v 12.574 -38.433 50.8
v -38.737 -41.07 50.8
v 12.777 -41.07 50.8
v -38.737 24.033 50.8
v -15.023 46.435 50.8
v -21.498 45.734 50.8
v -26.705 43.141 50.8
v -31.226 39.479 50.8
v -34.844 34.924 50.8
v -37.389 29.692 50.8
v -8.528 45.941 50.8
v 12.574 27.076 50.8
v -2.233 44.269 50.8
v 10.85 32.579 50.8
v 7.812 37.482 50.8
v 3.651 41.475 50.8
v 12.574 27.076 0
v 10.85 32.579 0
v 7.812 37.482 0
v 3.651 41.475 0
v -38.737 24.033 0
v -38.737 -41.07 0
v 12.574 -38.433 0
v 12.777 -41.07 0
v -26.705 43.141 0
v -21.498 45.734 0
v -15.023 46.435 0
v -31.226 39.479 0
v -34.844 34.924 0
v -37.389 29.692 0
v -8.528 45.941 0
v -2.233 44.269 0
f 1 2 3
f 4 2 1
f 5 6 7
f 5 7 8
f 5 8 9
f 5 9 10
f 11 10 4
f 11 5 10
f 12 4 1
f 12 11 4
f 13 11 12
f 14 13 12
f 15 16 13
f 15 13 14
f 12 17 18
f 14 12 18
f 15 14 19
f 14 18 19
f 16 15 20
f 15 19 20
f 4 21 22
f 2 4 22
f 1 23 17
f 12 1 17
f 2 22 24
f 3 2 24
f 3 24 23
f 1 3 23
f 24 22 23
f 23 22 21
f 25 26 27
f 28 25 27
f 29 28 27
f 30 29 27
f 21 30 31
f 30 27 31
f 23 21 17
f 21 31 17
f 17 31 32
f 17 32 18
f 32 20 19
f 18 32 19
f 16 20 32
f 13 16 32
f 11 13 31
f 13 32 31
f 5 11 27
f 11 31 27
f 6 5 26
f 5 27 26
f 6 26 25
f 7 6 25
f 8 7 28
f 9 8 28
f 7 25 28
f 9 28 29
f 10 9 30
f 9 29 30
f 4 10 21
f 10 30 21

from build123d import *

# Parameters (mm, degrees)
F1_DEPTH = 50.8
F2_DEPTH = 25.4


with BuildPart() as f1:
    # F0 (on Top) → F1 (new body)
    with BuildSketch(Plane.XY):
        with BuildLine():
            ThreePointArc((3.650646, 41.4754), (-8.528173, 45.941043), (-21.498252, 45.734487))
            ThreePointArc((-21.498252, 45.734487), (-33.159754, 37.300433), (-38.737416, 24.033422))
            Line((-38.737416, 24.033422), (-38.737416, -10.444905))
            Line((-38.737416, -10.444905), (-38.737416, -14.095552))
            Line((-38.737416, -14.095552), (-38.737416, -41.069772))
            Line((-38.737416, -41.069772), (12.777264, -41.069772))
            Line((12.777264, -41.069772), (12.574449, -38.433194))
            Line((12.574449, -38.433194), (12.574449, -13.892737))
            Line((12.574449, -13.892737), (12.574449, 27.075628))
            ThreePointArc((12.574449, 27.075628), (9.485068, 35.12609), (3.650646, 41.4754))
        make_face()
    extrude(amount=F1_DEPTH)

    # F0 (on Top) → F2 (join)
    with BuildSketch(Plane.XY):
        with BuildLine():
            ThreePointArc((3.650646, 41.4754), (-8.528173, 45.941043), (-21.498252, 45.734487))
            ThreePointArc((-21.498252, 45.734487), (-33.159754, 37.300433), (-38.737416, 24.033422))
            Line((-38.737416, 24.033422), (-38.737416, -10.444905))
            Line((-38.737416, -10.444905), (-38.737416, -14.095552))
            Line((-38.737416, -14.095552), (-38.737416, -41.069772))
            Line((-38.737416, -41.069772), (12.777264, -41.069772))
            Line((12.777264, -41.069772), (12.574449, -38.433194))
            Line((12.574449, -38.433194), (12.574449, -13.892737))
            Line((12.574449, -13.892737), (12.574449, 27.075628))
            ThreePointArc((12.574449, 27.075628), (9.485068, 35.12609), (3.650646, 41.4754))
        make_face()
    extrude(amount=F2_DEPTH)


solid = f1.part
